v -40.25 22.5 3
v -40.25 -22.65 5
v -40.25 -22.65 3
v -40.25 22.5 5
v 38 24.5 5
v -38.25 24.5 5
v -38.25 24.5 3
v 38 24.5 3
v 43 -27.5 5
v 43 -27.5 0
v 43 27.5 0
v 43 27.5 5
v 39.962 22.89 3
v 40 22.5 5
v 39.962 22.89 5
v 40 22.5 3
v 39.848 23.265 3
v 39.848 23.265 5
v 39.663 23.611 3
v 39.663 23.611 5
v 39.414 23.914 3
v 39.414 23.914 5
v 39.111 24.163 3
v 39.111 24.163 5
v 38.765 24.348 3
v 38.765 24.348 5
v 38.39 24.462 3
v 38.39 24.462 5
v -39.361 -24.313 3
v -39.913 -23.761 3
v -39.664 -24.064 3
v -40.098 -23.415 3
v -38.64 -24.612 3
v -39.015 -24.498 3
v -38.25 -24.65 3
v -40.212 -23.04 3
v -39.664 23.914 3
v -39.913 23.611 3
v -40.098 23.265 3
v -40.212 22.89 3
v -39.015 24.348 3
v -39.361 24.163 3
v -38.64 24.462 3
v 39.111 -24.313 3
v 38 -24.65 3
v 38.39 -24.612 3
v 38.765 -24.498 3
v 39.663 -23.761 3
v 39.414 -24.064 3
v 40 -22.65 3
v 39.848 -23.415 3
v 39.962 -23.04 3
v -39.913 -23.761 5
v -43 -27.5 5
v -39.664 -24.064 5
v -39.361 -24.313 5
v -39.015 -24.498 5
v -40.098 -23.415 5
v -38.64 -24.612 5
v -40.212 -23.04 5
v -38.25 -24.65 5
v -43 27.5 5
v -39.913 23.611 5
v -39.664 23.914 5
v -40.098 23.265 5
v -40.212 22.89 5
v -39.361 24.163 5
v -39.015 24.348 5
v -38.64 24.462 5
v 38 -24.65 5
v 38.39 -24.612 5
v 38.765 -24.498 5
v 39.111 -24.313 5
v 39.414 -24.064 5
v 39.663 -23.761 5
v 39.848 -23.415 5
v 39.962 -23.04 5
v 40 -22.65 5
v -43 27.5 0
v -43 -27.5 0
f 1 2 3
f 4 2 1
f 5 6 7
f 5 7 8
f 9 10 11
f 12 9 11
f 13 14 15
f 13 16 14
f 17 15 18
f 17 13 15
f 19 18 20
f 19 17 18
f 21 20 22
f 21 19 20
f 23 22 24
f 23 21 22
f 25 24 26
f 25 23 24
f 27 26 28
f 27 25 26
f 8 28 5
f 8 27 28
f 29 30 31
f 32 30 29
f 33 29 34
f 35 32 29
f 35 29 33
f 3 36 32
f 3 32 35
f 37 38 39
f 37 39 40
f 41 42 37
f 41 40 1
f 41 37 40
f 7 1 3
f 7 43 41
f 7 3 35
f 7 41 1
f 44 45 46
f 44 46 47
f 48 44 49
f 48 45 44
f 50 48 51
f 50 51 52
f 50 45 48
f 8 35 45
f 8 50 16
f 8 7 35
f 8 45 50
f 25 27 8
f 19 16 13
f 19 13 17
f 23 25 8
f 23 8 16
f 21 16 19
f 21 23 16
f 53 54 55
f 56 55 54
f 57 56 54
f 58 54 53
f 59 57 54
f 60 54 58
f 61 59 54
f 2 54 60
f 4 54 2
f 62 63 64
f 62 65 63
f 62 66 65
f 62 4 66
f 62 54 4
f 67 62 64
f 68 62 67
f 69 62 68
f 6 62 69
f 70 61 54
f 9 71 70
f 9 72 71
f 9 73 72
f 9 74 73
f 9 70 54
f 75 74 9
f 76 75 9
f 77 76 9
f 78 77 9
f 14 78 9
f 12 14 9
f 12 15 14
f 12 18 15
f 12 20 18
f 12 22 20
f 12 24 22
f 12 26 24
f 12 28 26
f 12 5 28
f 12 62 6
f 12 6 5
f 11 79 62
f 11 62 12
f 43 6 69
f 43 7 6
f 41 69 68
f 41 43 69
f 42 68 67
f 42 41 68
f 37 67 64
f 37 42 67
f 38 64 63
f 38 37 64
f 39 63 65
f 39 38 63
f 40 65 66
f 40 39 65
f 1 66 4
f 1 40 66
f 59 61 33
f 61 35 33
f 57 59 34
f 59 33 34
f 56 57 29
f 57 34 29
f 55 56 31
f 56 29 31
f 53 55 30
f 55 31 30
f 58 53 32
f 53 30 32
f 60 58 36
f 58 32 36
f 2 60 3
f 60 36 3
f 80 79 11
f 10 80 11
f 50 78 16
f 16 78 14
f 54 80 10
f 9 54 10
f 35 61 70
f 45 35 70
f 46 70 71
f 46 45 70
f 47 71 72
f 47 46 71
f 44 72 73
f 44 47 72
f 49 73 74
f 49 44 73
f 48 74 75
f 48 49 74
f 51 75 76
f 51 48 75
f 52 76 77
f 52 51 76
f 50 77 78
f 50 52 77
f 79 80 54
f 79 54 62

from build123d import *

# Parameters (mm, degrees)
F0_W     = 86
F0_H     = 55
F1_DEPTH = 5
F2_W     = 80.25
F2_H     = 49.15
F3_DEPTH = 2
F4_R     = 2


with BuildPart() as f1:
    # F0 (on Top) → F1 (new body)
    with BuildSketch(Plane.XY):
        Rectangle(F0_W, F0_H)
    extrude(amount=F1_DEPTH)

    # F2 (on face) → F3 (cut)
    with BuildSketch(Plane.XY.offset(5)):
        with Locations((-0.125, -0.075)):
            Rectangle(F2_W, F2_H)
    extrude(amount=-F3_DEPTH, mode=Mode.SUBTRACT)

    # F4
    f4_edges = [f1.edges().sort_by_distance(p)[0] for p in [
        (-40.25, 24.5, 4),
        (-40.25, -24.65, 4),
        (40, 24.5, 4),
        (40, -24.65, 4),
    ]]
    fillet(f4_edges, radius=F4_R)


solid = f1.part
